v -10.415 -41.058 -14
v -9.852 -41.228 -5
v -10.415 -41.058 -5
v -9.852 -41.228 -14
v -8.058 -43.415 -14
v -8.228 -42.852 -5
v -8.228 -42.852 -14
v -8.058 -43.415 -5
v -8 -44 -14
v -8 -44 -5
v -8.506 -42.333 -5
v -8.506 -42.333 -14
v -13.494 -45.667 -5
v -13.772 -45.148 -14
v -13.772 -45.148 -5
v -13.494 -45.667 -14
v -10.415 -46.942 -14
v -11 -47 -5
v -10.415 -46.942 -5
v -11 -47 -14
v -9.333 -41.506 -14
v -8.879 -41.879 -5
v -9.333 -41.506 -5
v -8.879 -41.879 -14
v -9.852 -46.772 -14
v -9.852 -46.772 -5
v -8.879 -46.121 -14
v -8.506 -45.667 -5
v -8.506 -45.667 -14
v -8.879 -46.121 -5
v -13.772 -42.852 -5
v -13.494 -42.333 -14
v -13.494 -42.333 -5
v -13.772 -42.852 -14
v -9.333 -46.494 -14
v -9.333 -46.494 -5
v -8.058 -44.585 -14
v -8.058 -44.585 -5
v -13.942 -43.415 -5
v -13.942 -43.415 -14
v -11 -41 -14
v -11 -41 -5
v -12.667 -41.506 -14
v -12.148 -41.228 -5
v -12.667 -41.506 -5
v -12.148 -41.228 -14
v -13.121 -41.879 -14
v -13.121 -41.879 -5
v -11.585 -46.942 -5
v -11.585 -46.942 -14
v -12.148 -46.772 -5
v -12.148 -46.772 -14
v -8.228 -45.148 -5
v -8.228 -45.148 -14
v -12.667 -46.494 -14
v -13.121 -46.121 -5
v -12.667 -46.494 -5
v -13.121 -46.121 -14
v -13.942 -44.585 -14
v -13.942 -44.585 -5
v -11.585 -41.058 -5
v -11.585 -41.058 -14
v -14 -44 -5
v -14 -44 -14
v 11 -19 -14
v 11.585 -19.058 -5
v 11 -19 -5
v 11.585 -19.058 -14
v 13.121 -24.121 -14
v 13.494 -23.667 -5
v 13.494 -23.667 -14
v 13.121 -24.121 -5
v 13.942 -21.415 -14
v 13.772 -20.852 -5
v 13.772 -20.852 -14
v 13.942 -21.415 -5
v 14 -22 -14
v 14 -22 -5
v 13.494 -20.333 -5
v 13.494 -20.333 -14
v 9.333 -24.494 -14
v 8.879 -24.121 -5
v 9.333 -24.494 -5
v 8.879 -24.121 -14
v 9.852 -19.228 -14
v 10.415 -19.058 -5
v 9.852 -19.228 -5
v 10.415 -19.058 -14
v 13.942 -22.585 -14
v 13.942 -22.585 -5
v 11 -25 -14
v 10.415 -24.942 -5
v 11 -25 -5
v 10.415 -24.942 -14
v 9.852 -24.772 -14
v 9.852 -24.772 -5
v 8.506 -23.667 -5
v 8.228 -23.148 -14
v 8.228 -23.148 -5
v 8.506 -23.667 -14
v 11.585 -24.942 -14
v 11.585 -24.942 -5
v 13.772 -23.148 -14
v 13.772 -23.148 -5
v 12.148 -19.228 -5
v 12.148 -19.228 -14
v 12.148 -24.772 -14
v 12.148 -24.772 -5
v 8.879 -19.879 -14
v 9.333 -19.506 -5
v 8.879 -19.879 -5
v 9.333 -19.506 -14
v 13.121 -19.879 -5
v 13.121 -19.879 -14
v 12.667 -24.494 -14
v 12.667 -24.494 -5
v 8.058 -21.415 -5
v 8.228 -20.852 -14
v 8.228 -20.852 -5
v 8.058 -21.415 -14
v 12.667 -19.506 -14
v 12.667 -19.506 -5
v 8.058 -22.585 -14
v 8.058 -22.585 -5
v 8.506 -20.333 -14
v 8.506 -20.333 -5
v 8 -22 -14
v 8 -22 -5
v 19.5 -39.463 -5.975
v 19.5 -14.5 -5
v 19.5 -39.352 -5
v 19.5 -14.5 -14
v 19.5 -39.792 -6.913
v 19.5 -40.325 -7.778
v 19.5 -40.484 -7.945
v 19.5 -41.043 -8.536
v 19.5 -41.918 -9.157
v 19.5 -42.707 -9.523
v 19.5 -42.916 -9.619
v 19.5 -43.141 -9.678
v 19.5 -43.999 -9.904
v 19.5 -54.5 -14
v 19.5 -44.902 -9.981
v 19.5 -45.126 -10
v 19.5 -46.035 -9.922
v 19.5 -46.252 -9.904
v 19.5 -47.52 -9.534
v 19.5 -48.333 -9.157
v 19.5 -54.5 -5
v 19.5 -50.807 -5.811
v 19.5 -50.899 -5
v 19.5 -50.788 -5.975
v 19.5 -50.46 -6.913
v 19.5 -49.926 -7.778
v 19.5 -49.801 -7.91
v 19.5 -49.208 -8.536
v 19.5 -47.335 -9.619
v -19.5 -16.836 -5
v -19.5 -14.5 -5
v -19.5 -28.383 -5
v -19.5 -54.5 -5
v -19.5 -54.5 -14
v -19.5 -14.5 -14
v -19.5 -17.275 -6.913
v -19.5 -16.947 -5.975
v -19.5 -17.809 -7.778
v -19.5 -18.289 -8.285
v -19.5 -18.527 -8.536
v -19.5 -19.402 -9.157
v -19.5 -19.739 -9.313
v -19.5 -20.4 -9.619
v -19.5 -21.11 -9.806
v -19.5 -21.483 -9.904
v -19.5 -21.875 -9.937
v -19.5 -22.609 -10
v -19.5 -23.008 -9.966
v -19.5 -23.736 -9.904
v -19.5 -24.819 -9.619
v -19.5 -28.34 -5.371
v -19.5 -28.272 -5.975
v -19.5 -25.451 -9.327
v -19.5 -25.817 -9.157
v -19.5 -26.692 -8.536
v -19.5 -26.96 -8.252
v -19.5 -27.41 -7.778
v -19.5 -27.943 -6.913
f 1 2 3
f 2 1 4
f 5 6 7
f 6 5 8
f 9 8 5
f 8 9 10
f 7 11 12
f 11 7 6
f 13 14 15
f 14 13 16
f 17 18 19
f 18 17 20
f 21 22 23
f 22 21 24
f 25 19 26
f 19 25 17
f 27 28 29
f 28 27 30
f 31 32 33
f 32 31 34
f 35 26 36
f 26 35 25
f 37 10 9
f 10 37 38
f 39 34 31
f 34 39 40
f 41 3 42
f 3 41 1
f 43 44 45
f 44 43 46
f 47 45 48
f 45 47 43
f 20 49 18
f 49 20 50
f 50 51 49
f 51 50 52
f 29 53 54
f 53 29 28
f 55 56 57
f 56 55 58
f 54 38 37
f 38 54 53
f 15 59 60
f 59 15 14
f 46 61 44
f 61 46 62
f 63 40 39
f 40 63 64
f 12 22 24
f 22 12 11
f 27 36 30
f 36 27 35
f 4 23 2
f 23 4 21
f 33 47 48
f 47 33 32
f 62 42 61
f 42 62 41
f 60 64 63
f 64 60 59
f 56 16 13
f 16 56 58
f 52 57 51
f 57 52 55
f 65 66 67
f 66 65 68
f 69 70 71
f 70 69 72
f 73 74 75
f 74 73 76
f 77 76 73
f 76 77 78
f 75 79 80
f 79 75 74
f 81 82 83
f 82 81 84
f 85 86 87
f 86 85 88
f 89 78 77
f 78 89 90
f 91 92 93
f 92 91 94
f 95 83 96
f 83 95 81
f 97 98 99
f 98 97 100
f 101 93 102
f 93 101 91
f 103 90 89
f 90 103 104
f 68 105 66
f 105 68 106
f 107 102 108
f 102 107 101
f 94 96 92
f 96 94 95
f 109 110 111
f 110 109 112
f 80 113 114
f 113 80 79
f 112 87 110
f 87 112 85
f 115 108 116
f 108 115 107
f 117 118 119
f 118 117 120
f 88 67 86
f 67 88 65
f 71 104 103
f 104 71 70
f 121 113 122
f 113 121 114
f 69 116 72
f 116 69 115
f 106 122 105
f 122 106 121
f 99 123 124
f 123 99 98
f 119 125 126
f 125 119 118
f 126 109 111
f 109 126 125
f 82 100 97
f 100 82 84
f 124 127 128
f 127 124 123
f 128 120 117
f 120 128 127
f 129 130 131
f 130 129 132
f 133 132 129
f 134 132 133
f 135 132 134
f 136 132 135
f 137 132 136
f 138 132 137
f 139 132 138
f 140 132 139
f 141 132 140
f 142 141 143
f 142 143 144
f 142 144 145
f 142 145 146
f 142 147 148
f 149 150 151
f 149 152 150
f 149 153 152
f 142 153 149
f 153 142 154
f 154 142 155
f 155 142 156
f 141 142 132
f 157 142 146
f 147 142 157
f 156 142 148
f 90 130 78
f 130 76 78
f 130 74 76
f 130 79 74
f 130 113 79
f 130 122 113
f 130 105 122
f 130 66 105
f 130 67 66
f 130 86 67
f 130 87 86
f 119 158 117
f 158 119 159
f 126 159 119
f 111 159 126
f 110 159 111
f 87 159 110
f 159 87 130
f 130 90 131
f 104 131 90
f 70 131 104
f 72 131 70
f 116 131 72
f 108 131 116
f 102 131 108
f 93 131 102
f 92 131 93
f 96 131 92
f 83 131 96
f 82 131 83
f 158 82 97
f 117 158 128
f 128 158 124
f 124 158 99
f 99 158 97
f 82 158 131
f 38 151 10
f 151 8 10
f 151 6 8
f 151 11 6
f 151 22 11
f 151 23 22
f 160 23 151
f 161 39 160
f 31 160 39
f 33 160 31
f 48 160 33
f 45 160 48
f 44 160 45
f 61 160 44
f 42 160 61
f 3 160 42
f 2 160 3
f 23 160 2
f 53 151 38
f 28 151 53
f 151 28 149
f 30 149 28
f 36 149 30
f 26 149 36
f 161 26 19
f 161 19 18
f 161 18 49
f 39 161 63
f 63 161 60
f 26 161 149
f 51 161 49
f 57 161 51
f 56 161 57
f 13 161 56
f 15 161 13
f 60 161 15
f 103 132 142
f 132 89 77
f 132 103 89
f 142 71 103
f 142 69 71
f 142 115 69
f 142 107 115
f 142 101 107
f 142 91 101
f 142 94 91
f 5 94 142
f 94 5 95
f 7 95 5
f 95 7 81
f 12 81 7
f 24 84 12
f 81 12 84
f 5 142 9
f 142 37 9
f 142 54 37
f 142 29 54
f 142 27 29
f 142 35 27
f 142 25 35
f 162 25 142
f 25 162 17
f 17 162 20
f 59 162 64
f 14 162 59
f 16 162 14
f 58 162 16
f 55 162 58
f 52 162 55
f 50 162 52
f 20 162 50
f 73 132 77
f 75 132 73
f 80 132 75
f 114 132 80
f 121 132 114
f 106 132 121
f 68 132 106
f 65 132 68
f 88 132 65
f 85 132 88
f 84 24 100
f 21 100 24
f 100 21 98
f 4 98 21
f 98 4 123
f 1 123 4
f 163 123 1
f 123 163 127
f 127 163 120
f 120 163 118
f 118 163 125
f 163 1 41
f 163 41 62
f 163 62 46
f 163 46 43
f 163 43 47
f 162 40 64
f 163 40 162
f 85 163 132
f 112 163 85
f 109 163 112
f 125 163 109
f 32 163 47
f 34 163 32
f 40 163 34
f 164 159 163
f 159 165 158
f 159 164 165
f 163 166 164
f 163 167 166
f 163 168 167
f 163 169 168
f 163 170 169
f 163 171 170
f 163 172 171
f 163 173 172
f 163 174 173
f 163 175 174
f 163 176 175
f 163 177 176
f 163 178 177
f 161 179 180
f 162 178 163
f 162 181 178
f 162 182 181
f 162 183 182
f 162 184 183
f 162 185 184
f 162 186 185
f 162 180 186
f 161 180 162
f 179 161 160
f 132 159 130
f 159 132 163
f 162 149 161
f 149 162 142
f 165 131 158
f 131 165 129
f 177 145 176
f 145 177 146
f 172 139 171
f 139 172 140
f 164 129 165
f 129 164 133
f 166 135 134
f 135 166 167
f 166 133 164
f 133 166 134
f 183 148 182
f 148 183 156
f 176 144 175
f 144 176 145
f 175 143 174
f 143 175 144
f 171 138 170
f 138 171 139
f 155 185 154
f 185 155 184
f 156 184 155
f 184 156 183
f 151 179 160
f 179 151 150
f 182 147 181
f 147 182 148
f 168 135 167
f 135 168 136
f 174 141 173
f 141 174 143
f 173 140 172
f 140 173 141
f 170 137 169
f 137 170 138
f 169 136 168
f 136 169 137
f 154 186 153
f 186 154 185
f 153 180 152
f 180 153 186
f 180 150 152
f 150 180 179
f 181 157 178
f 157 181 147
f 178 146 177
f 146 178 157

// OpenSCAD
$fn=32;

*difference() {
    union() {
        translate([-39/2, -29/2, 0])
            cube([39, 29, 9]);
        translate([-39/2, -29/2-40, -5])
            cube([39, 40, 14]);
    }

    translate([-35/2, -25/2, -.001])
        cube([35, 25, 2]);
    
    rotate([90, 0, 0])
        translate([0, 0, -15])
            scale([1, 2, 1])
                cylinder(27.5, 3, 3);
    
    rotate([90, 0, 0])
        translate([0, 0, -14.5+5])
            scale([1, 2, 1])
                cylinder(4, 4.5, 4.5);
    
    for(i=[-11,11])
        translate([i, 0, 0]) {
            cylinder(100, 3, 3);
            translate([0, 0, 5.001])
                rotate([0, 0, 360/12])
                    cylinder(4, 5.6, 5.6, $fn=6);
 
            translate([0, -33+i, -50])
                cylinder(100, 3, 3);
            translate([0, -33+i, 0]) {
                translate([0, 0, 5.001])
                    rotate([0, 0, 360/12])
                        cylinder(4, 5.6, 5.6, $fn=6);
            }
        }
        

    translate([-50, -5, -5])
        rotate([90, 0, 60])
            cylinder(100, 5, 5);   
}


difference() {
    translate([-39/2, -29/2-40, -14])
        cube([39, 40, 9]);
    translate([-50, -5, -5])
        rotate([90, 0, 60])
            cylinder(100, 5, 5);   
    for(i=[-11,11])
        translate([i, 0, 0])
            translate([0, -33+i, -50])
                cylinder(100, 3, 3);
}
